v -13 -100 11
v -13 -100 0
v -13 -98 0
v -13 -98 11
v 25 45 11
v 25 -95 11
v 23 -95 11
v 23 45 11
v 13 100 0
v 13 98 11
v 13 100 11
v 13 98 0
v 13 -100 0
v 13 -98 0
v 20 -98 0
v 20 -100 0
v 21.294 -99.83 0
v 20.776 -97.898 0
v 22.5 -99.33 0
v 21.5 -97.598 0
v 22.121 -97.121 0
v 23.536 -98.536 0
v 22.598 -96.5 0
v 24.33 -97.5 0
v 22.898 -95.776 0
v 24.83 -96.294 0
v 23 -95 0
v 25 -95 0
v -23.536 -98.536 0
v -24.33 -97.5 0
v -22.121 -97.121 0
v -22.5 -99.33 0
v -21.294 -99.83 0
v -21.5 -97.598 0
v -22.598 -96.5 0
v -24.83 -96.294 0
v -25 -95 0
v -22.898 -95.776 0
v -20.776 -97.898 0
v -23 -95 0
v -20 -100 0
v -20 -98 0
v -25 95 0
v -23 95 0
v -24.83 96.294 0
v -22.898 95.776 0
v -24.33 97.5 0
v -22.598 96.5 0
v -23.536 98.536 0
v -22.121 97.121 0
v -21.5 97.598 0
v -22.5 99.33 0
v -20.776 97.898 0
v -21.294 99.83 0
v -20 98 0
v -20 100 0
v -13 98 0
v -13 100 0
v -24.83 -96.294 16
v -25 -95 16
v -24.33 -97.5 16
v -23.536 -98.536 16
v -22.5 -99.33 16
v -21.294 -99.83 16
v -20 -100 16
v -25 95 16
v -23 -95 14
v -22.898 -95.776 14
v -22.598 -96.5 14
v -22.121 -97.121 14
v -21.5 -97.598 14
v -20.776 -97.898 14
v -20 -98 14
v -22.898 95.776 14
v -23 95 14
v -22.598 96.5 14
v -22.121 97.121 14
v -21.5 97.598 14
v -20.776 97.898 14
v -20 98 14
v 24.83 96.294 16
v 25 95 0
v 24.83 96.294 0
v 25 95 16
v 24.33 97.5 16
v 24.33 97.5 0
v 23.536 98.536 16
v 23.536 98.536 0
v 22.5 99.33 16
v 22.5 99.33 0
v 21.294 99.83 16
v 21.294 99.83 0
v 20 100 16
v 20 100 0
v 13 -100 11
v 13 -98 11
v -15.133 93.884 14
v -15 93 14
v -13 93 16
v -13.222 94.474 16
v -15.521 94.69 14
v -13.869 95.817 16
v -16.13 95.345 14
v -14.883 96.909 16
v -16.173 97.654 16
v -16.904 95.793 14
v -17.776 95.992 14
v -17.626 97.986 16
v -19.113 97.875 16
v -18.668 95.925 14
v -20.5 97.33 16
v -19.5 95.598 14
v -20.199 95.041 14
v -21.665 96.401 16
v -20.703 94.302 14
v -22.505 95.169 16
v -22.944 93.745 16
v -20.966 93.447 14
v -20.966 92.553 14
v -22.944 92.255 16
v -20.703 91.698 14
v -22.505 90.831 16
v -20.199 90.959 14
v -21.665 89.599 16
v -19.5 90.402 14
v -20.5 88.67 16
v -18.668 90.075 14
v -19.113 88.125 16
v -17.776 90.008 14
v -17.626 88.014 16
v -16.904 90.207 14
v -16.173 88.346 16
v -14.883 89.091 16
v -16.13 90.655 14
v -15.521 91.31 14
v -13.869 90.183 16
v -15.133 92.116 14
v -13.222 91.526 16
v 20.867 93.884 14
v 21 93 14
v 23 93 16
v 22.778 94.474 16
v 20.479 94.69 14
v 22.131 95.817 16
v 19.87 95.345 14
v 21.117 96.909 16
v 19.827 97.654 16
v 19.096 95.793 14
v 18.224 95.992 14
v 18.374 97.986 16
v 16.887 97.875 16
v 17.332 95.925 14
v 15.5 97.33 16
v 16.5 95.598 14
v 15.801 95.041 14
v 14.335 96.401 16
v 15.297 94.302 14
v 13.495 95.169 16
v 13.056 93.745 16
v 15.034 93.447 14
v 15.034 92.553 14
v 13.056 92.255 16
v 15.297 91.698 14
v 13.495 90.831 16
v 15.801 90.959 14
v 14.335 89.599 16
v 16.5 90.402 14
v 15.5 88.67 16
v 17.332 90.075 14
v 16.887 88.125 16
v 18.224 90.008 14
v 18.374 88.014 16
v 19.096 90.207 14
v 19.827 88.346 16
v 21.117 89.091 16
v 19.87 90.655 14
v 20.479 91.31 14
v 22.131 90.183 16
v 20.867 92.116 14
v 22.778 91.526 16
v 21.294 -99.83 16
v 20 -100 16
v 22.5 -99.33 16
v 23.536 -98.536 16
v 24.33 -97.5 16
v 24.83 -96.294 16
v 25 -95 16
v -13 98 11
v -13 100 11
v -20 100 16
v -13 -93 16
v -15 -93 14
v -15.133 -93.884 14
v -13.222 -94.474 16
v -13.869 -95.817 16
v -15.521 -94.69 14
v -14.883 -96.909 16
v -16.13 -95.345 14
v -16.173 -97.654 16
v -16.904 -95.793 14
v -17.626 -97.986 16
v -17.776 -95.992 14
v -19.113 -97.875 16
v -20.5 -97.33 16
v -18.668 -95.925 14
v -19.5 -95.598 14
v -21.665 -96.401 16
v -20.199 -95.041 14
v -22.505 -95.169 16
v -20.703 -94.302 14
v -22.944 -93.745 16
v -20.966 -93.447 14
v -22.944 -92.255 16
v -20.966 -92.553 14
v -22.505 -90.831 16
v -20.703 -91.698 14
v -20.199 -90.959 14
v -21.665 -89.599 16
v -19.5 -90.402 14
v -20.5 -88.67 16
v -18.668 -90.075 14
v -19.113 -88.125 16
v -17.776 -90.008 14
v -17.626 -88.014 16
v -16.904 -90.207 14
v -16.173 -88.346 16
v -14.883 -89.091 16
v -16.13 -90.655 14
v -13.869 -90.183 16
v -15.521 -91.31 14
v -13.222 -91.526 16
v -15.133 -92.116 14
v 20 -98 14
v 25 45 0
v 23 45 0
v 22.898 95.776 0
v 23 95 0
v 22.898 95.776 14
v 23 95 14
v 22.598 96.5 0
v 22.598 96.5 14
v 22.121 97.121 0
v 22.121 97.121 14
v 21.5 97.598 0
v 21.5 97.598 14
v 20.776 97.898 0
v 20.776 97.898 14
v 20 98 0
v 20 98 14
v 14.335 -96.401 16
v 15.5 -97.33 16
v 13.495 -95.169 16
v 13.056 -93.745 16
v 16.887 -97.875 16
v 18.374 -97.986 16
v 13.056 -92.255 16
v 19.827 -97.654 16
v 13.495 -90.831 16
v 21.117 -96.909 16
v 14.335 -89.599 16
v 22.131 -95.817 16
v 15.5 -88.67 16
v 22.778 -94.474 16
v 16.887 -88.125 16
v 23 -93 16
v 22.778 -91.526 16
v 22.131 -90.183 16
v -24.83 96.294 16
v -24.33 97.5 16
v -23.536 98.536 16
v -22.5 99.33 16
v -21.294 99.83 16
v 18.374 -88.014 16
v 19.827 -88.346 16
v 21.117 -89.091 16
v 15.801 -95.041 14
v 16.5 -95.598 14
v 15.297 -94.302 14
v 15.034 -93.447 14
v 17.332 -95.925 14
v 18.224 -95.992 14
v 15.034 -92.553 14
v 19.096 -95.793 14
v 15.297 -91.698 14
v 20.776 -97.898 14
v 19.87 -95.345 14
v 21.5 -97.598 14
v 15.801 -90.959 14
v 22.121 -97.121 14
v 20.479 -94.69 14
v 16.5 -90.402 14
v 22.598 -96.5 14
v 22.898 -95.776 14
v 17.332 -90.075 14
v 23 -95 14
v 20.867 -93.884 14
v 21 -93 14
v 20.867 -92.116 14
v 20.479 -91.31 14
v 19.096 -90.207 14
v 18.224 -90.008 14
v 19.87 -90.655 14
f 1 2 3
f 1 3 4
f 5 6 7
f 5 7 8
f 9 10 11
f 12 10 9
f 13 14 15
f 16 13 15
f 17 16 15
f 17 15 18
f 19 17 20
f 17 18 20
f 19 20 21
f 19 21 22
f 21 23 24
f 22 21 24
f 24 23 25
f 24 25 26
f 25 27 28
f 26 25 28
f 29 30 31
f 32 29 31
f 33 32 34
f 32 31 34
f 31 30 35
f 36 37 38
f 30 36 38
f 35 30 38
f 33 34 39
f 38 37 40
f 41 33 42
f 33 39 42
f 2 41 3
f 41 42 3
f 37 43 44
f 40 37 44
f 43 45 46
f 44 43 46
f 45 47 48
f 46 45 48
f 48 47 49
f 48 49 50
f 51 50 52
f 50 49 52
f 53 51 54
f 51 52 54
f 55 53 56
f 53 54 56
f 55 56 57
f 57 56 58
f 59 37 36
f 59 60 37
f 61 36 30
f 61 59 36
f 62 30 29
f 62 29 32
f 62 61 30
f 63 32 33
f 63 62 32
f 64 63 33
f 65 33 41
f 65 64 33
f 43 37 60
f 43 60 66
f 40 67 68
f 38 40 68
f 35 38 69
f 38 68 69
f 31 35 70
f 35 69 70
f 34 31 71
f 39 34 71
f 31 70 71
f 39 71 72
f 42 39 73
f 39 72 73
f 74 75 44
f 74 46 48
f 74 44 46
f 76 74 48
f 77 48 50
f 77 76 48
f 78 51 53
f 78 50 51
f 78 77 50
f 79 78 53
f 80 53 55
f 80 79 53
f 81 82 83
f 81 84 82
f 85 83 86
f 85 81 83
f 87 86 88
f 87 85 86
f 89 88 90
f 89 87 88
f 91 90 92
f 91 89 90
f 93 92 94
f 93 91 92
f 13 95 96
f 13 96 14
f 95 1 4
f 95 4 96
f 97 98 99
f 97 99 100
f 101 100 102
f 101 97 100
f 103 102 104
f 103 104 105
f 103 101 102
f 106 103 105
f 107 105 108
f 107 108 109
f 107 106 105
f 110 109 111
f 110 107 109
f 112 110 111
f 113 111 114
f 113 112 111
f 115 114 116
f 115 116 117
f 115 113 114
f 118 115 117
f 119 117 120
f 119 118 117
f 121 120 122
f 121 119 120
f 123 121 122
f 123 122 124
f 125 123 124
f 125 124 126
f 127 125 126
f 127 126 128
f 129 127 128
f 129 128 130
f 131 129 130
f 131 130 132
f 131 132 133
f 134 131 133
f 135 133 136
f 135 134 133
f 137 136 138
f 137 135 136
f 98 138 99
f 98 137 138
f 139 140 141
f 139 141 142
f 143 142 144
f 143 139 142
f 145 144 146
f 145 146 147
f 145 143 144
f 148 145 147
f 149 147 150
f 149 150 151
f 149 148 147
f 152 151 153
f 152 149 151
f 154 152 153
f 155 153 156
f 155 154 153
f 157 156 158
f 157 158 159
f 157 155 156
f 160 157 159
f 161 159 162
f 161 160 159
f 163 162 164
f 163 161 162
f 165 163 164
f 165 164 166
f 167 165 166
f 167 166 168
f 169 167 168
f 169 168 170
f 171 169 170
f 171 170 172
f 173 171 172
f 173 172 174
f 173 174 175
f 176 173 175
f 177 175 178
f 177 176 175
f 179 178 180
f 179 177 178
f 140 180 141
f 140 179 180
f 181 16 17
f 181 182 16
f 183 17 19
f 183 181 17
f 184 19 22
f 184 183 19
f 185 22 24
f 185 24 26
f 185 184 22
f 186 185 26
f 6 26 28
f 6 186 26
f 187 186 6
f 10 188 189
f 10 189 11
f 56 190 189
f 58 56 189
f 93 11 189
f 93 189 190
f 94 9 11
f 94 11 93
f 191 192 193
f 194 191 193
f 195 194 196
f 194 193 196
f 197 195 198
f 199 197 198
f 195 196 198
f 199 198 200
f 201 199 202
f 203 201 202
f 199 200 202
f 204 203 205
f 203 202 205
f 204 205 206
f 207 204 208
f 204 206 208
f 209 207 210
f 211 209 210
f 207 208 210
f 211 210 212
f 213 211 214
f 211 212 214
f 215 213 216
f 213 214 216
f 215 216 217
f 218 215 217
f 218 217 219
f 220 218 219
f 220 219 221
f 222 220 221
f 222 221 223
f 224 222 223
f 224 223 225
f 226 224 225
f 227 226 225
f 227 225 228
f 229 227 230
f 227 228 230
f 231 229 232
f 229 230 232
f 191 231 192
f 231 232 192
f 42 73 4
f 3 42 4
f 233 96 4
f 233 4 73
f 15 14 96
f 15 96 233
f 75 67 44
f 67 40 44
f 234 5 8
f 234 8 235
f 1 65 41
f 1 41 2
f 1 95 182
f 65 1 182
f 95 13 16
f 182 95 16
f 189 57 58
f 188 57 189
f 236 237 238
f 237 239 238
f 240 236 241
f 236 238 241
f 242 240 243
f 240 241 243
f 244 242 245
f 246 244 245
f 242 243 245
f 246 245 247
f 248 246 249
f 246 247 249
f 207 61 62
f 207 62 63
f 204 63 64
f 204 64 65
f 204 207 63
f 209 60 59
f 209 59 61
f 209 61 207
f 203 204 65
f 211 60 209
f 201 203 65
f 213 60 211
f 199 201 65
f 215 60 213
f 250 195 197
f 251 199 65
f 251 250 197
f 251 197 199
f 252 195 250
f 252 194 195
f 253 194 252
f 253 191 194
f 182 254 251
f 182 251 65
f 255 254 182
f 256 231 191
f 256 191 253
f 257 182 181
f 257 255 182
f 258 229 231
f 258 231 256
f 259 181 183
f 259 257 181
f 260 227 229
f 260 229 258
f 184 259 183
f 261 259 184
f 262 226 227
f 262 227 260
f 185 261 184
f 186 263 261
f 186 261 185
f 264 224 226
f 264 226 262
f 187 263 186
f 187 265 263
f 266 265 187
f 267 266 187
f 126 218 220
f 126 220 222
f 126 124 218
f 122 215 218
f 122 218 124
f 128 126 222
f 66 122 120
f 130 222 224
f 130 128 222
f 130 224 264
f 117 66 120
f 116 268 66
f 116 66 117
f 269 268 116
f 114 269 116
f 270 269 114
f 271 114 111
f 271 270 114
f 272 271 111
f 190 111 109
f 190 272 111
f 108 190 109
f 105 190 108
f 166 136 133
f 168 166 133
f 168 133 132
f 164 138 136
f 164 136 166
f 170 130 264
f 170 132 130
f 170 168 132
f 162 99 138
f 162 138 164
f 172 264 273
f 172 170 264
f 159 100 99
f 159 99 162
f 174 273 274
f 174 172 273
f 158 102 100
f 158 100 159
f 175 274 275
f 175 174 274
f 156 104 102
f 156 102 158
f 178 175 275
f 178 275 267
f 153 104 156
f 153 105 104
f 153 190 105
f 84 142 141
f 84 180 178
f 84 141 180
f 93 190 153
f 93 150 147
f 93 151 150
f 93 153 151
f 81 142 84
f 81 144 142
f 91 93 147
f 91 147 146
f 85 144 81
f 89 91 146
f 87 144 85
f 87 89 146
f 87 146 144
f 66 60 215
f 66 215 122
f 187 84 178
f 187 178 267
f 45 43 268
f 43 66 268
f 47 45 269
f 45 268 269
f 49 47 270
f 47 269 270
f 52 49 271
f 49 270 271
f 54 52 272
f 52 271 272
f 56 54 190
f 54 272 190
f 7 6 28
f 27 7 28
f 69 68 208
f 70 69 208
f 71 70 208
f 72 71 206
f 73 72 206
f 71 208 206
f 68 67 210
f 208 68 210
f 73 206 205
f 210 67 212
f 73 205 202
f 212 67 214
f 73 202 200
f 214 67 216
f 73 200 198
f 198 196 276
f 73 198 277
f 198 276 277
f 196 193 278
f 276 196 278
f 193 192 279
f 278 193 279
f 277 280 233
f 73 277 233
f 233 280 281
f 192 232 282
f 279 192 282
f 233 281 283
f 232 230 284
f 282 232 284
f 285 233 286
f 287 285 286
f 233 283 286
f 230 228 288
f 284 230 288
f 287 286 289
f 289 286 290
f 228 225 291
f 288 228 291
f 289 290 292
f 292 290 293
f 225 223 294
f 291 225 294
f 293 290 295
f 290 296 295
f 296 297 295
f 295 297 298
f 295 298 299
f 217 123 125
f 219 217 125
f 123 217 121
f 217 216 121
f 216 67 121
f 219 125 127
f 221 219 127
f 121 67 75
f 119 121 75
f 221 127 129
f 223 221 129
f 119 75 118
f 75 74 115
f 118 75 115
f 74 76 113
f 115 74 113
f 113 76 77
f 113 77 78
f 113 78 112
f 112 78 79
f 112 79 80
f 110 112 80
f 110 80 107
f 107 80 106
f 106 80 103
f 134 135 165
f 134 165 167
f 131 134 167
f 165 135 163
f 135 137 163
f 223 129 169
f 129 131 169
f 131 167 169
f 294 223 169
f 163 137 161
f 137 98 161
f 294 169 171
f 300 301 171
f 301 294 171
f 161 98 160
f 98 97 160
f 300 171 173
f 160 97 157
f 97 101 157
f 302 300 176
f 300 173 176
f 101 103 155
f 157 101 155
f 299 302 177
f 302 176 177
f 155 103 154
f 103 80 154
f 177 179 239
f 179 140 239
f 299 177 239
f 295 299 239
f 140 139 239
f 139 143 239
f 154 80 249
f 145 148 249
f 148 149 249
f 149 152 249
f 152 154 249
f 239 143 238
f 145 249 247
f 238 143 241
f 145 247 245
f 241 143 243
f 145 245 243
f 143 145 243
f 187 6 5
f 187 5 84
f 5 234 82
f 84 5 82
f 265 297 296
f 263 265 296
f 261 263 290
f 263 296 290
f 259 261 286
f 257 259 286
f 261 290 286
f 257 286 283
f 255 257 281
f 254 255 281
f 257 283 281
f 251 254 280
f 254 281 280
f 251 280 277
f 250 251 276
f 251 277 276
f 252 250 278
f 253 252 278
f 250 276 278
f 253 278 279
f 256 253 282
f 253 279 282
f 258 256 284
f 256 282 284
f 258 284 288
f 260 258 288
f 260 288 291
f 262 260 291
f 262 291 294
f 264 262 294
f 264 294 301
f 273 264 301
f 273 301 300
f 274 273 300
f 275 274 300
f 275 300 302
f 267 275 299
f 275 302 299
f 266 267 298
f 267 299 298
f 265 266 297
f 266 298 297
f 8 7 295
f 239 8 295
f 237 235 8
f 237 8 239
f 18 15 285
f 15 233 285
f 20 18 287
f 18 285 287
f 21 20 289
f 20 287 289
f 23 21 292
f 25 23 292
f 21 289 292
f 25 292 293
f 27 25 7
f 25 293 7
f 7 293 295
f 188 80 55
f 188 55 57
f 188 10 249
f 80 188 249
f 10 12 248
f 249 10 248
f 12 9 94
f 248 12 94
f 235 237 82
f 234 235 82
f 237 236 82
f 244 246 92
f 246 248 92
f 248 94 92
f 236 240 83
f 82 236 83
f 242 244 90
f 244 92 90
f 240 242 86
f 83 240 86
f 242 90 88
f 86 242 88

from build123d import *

# Parameters (mm, degrees)
SCHIZZO1_W                    = 50
SCHIZZO1_H                    = 200
ESTRUSIONE_ESTRUSIONE1_DEPTH  = 16
RACCORDO1_R                   = 5
SVUOTA1_T                     = -2
TAGLIO_ESTRUSIONE1_DEPTH      = 203.190504228
TAGLIO_ESTRUSIONE1_DEPTH_BACK = 203.190504228
SCHIZZO8_R                    = 3
TAGLIO_ESTRUSIONE2_DEPTH      = 105.312031904
SCHIZZO5_W                    = 11
SCHIZZO5_H                    = 140
TAGLIO_ESTRUSIONE3_DEPTH      = 7
SMUSSO1_SIZE                  = 2


with BuildPart() as part:
    # Schizzo1 → Estrusione-Estrusione1 (new body)
    with BuildSketch(Plane.XY):
        Rectangle(SCHIZZO1_W, SCHIZZO1_H)
    extrude(amount=ESTRUSIONE_ESTRUSIONE1_DEPTH)

    # Raccordo1
    raccordo1_edges = [part.edges().sort_by_distance(p)[0] for p in [
        (25, -100, 8),
        (-25, -100, 8),
        (-25, 100, 8),
        (25, 100, 8),
    ]]
    fillet(raccordo1_edges, radius=RACCORDO1_R)

    # Svuota1
    svuota1_openings = [part.faces().sort_by_distance(p)[0] for p in [
        (0, 0, 0),
    ]]
    offset(amount=SVUOTA1_T, openings=svuota1_openings, kind=Kind.INTERSECTION)

    # Schizzo4 → Taglio-Estrusione1 (cut, two sides: drawn at the far end of the back side and taken through both)
    with BuildSketch(Plane(origin=(0, 100, 0), x_dir=(1, 0, 0), z_dir=(0, 1, 0)).offset(-TAGLIO_ESTRUSIONE1_DEPTH_BACK)):
        Polygon((-13, 92.462112512), (-13, 0), (-13, -11), (13, -11), (13, 0), (13, 92.462112512), (13, 277.386337537), (-13, 277.386337537), align=None)
    extrude(amount=TAGLIO_ESTRUSIONE1_DEPTH + TAGLIO_ESTRUSIONE1_DEPTH_BACK, mode=Mode.SUBTRACT)

    # Schizzo8 → Taglio-Estrusione2 (cut, through all)
    with BuildSketch(Plane.XY.offset(16)):
        with Locations((-18, 93)):
            Circle(SCHIZZO8_R)
        with Locations((18, 93)):
            Circle(SCHIZZO8_R)
    taglio_estrusione2 = extrude(amount=-TAGLIO_ESTRUSIONE2_DEPTH, mode=Mode.SUBTRACT)

    # Specchia1: Taglio-Estrusione2 across plane
    add(taglio_estrusione2.mirror(Plane.ZX), mode=Mode.SUBTRACT)

    # Schizzo5 → Taglio-Estrusione3 (cut)
    with BuildSketch(Plane(origin=(25, 0, 0), x_dir=(0, 0, -1), z_dir=(1, 0, 0))):
        with Locations((-5.5, -25)):
            Rectangle(SCHIZZO5_W, SCHIZZO5_H)
    extrude(amount=-TAGLIO_ESTRUSIONE3_DEPTH, mode=Mode.SUBTRACT)

    # Smusso1
    smusso1_edges = [part.edges().sort_by_distance(p)[0] for p in [
        (15, -93, 16),
        (-21, 93, 16),
        (15, 93, 16),
        (-21, -93, 16),
    ]]
    chamfer(smusso1_edges, length=SMUSSO1_SIZE - 0.0001)  # a hair under: the kernel refuses the full size


solid = part.part
